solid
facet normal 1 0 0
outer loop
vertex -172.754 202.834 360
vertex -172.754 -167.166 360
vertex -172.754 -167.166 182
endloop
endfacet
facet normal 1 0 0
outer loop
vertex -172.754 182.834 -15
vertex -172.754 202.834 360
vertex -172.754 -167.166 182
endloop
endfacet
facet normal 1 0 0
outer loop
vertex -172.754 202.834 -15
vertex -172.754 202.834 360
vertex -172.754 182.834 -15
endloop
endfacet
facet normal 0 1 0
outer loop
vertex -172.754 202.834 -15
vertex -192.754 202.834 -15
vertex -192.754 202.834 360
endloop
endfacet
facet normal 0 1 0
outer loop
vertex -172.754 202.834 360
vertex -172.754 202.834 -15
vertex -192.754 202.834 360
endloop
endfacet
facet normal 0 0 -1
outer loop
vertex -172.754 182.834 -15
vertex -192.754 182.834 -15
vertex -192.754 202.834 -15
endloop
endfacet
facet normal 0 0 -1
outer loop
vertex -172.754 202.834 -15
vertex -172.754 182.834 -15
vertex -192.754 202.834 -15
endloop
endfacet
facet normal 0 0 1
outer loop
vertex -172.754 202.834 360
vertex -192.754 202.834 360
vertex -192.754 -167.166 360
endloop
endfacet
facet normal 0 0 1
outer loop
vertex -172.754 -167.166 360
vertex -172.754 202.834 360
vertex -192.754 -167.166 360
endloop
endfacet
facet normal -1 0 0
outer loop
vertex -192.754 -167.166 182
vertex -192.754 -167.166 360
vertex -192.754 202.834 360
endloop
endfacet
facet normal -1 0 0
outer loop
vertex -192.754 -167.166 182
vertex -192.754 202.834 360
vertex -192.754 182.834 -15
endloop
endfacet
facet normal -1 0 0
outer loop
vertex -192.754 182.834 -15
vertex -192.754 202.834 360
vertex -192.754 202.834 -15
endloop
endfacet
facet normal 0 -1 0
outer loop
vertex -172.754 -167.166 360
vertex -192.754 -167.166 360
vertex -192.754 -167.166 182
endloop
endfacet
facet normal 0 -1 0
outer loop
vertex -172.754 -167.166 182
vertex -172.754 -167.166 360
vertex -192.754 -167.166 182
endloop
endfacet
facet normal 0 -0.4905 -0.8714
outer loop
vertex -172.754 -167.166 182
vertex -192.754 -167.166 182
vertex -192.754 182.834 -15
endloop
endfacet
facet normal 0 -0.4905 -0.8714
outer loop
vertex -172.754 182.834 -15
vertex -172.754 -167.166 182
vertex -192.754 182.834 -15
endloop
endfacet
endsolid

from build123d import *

# Parameters (mm, degrees)
SALIENTE_EXTRUIR1_DEPTH = 20


with BuildPart() as part:
    # Croquis2 → Saliente-Extruir1 (new body)
    with BuildSketch(Plane.ZY.offset(192.754092983)):
        Polygon((360, 202.834413862), (360, -167.165586138), (182, -167.165586138), (-15, 182.834413862), (-15, 202.834413862), align=None)
    extrude(amount=-SALIENTE_EXTRUIR1_DEPTH)


solid = part.part
